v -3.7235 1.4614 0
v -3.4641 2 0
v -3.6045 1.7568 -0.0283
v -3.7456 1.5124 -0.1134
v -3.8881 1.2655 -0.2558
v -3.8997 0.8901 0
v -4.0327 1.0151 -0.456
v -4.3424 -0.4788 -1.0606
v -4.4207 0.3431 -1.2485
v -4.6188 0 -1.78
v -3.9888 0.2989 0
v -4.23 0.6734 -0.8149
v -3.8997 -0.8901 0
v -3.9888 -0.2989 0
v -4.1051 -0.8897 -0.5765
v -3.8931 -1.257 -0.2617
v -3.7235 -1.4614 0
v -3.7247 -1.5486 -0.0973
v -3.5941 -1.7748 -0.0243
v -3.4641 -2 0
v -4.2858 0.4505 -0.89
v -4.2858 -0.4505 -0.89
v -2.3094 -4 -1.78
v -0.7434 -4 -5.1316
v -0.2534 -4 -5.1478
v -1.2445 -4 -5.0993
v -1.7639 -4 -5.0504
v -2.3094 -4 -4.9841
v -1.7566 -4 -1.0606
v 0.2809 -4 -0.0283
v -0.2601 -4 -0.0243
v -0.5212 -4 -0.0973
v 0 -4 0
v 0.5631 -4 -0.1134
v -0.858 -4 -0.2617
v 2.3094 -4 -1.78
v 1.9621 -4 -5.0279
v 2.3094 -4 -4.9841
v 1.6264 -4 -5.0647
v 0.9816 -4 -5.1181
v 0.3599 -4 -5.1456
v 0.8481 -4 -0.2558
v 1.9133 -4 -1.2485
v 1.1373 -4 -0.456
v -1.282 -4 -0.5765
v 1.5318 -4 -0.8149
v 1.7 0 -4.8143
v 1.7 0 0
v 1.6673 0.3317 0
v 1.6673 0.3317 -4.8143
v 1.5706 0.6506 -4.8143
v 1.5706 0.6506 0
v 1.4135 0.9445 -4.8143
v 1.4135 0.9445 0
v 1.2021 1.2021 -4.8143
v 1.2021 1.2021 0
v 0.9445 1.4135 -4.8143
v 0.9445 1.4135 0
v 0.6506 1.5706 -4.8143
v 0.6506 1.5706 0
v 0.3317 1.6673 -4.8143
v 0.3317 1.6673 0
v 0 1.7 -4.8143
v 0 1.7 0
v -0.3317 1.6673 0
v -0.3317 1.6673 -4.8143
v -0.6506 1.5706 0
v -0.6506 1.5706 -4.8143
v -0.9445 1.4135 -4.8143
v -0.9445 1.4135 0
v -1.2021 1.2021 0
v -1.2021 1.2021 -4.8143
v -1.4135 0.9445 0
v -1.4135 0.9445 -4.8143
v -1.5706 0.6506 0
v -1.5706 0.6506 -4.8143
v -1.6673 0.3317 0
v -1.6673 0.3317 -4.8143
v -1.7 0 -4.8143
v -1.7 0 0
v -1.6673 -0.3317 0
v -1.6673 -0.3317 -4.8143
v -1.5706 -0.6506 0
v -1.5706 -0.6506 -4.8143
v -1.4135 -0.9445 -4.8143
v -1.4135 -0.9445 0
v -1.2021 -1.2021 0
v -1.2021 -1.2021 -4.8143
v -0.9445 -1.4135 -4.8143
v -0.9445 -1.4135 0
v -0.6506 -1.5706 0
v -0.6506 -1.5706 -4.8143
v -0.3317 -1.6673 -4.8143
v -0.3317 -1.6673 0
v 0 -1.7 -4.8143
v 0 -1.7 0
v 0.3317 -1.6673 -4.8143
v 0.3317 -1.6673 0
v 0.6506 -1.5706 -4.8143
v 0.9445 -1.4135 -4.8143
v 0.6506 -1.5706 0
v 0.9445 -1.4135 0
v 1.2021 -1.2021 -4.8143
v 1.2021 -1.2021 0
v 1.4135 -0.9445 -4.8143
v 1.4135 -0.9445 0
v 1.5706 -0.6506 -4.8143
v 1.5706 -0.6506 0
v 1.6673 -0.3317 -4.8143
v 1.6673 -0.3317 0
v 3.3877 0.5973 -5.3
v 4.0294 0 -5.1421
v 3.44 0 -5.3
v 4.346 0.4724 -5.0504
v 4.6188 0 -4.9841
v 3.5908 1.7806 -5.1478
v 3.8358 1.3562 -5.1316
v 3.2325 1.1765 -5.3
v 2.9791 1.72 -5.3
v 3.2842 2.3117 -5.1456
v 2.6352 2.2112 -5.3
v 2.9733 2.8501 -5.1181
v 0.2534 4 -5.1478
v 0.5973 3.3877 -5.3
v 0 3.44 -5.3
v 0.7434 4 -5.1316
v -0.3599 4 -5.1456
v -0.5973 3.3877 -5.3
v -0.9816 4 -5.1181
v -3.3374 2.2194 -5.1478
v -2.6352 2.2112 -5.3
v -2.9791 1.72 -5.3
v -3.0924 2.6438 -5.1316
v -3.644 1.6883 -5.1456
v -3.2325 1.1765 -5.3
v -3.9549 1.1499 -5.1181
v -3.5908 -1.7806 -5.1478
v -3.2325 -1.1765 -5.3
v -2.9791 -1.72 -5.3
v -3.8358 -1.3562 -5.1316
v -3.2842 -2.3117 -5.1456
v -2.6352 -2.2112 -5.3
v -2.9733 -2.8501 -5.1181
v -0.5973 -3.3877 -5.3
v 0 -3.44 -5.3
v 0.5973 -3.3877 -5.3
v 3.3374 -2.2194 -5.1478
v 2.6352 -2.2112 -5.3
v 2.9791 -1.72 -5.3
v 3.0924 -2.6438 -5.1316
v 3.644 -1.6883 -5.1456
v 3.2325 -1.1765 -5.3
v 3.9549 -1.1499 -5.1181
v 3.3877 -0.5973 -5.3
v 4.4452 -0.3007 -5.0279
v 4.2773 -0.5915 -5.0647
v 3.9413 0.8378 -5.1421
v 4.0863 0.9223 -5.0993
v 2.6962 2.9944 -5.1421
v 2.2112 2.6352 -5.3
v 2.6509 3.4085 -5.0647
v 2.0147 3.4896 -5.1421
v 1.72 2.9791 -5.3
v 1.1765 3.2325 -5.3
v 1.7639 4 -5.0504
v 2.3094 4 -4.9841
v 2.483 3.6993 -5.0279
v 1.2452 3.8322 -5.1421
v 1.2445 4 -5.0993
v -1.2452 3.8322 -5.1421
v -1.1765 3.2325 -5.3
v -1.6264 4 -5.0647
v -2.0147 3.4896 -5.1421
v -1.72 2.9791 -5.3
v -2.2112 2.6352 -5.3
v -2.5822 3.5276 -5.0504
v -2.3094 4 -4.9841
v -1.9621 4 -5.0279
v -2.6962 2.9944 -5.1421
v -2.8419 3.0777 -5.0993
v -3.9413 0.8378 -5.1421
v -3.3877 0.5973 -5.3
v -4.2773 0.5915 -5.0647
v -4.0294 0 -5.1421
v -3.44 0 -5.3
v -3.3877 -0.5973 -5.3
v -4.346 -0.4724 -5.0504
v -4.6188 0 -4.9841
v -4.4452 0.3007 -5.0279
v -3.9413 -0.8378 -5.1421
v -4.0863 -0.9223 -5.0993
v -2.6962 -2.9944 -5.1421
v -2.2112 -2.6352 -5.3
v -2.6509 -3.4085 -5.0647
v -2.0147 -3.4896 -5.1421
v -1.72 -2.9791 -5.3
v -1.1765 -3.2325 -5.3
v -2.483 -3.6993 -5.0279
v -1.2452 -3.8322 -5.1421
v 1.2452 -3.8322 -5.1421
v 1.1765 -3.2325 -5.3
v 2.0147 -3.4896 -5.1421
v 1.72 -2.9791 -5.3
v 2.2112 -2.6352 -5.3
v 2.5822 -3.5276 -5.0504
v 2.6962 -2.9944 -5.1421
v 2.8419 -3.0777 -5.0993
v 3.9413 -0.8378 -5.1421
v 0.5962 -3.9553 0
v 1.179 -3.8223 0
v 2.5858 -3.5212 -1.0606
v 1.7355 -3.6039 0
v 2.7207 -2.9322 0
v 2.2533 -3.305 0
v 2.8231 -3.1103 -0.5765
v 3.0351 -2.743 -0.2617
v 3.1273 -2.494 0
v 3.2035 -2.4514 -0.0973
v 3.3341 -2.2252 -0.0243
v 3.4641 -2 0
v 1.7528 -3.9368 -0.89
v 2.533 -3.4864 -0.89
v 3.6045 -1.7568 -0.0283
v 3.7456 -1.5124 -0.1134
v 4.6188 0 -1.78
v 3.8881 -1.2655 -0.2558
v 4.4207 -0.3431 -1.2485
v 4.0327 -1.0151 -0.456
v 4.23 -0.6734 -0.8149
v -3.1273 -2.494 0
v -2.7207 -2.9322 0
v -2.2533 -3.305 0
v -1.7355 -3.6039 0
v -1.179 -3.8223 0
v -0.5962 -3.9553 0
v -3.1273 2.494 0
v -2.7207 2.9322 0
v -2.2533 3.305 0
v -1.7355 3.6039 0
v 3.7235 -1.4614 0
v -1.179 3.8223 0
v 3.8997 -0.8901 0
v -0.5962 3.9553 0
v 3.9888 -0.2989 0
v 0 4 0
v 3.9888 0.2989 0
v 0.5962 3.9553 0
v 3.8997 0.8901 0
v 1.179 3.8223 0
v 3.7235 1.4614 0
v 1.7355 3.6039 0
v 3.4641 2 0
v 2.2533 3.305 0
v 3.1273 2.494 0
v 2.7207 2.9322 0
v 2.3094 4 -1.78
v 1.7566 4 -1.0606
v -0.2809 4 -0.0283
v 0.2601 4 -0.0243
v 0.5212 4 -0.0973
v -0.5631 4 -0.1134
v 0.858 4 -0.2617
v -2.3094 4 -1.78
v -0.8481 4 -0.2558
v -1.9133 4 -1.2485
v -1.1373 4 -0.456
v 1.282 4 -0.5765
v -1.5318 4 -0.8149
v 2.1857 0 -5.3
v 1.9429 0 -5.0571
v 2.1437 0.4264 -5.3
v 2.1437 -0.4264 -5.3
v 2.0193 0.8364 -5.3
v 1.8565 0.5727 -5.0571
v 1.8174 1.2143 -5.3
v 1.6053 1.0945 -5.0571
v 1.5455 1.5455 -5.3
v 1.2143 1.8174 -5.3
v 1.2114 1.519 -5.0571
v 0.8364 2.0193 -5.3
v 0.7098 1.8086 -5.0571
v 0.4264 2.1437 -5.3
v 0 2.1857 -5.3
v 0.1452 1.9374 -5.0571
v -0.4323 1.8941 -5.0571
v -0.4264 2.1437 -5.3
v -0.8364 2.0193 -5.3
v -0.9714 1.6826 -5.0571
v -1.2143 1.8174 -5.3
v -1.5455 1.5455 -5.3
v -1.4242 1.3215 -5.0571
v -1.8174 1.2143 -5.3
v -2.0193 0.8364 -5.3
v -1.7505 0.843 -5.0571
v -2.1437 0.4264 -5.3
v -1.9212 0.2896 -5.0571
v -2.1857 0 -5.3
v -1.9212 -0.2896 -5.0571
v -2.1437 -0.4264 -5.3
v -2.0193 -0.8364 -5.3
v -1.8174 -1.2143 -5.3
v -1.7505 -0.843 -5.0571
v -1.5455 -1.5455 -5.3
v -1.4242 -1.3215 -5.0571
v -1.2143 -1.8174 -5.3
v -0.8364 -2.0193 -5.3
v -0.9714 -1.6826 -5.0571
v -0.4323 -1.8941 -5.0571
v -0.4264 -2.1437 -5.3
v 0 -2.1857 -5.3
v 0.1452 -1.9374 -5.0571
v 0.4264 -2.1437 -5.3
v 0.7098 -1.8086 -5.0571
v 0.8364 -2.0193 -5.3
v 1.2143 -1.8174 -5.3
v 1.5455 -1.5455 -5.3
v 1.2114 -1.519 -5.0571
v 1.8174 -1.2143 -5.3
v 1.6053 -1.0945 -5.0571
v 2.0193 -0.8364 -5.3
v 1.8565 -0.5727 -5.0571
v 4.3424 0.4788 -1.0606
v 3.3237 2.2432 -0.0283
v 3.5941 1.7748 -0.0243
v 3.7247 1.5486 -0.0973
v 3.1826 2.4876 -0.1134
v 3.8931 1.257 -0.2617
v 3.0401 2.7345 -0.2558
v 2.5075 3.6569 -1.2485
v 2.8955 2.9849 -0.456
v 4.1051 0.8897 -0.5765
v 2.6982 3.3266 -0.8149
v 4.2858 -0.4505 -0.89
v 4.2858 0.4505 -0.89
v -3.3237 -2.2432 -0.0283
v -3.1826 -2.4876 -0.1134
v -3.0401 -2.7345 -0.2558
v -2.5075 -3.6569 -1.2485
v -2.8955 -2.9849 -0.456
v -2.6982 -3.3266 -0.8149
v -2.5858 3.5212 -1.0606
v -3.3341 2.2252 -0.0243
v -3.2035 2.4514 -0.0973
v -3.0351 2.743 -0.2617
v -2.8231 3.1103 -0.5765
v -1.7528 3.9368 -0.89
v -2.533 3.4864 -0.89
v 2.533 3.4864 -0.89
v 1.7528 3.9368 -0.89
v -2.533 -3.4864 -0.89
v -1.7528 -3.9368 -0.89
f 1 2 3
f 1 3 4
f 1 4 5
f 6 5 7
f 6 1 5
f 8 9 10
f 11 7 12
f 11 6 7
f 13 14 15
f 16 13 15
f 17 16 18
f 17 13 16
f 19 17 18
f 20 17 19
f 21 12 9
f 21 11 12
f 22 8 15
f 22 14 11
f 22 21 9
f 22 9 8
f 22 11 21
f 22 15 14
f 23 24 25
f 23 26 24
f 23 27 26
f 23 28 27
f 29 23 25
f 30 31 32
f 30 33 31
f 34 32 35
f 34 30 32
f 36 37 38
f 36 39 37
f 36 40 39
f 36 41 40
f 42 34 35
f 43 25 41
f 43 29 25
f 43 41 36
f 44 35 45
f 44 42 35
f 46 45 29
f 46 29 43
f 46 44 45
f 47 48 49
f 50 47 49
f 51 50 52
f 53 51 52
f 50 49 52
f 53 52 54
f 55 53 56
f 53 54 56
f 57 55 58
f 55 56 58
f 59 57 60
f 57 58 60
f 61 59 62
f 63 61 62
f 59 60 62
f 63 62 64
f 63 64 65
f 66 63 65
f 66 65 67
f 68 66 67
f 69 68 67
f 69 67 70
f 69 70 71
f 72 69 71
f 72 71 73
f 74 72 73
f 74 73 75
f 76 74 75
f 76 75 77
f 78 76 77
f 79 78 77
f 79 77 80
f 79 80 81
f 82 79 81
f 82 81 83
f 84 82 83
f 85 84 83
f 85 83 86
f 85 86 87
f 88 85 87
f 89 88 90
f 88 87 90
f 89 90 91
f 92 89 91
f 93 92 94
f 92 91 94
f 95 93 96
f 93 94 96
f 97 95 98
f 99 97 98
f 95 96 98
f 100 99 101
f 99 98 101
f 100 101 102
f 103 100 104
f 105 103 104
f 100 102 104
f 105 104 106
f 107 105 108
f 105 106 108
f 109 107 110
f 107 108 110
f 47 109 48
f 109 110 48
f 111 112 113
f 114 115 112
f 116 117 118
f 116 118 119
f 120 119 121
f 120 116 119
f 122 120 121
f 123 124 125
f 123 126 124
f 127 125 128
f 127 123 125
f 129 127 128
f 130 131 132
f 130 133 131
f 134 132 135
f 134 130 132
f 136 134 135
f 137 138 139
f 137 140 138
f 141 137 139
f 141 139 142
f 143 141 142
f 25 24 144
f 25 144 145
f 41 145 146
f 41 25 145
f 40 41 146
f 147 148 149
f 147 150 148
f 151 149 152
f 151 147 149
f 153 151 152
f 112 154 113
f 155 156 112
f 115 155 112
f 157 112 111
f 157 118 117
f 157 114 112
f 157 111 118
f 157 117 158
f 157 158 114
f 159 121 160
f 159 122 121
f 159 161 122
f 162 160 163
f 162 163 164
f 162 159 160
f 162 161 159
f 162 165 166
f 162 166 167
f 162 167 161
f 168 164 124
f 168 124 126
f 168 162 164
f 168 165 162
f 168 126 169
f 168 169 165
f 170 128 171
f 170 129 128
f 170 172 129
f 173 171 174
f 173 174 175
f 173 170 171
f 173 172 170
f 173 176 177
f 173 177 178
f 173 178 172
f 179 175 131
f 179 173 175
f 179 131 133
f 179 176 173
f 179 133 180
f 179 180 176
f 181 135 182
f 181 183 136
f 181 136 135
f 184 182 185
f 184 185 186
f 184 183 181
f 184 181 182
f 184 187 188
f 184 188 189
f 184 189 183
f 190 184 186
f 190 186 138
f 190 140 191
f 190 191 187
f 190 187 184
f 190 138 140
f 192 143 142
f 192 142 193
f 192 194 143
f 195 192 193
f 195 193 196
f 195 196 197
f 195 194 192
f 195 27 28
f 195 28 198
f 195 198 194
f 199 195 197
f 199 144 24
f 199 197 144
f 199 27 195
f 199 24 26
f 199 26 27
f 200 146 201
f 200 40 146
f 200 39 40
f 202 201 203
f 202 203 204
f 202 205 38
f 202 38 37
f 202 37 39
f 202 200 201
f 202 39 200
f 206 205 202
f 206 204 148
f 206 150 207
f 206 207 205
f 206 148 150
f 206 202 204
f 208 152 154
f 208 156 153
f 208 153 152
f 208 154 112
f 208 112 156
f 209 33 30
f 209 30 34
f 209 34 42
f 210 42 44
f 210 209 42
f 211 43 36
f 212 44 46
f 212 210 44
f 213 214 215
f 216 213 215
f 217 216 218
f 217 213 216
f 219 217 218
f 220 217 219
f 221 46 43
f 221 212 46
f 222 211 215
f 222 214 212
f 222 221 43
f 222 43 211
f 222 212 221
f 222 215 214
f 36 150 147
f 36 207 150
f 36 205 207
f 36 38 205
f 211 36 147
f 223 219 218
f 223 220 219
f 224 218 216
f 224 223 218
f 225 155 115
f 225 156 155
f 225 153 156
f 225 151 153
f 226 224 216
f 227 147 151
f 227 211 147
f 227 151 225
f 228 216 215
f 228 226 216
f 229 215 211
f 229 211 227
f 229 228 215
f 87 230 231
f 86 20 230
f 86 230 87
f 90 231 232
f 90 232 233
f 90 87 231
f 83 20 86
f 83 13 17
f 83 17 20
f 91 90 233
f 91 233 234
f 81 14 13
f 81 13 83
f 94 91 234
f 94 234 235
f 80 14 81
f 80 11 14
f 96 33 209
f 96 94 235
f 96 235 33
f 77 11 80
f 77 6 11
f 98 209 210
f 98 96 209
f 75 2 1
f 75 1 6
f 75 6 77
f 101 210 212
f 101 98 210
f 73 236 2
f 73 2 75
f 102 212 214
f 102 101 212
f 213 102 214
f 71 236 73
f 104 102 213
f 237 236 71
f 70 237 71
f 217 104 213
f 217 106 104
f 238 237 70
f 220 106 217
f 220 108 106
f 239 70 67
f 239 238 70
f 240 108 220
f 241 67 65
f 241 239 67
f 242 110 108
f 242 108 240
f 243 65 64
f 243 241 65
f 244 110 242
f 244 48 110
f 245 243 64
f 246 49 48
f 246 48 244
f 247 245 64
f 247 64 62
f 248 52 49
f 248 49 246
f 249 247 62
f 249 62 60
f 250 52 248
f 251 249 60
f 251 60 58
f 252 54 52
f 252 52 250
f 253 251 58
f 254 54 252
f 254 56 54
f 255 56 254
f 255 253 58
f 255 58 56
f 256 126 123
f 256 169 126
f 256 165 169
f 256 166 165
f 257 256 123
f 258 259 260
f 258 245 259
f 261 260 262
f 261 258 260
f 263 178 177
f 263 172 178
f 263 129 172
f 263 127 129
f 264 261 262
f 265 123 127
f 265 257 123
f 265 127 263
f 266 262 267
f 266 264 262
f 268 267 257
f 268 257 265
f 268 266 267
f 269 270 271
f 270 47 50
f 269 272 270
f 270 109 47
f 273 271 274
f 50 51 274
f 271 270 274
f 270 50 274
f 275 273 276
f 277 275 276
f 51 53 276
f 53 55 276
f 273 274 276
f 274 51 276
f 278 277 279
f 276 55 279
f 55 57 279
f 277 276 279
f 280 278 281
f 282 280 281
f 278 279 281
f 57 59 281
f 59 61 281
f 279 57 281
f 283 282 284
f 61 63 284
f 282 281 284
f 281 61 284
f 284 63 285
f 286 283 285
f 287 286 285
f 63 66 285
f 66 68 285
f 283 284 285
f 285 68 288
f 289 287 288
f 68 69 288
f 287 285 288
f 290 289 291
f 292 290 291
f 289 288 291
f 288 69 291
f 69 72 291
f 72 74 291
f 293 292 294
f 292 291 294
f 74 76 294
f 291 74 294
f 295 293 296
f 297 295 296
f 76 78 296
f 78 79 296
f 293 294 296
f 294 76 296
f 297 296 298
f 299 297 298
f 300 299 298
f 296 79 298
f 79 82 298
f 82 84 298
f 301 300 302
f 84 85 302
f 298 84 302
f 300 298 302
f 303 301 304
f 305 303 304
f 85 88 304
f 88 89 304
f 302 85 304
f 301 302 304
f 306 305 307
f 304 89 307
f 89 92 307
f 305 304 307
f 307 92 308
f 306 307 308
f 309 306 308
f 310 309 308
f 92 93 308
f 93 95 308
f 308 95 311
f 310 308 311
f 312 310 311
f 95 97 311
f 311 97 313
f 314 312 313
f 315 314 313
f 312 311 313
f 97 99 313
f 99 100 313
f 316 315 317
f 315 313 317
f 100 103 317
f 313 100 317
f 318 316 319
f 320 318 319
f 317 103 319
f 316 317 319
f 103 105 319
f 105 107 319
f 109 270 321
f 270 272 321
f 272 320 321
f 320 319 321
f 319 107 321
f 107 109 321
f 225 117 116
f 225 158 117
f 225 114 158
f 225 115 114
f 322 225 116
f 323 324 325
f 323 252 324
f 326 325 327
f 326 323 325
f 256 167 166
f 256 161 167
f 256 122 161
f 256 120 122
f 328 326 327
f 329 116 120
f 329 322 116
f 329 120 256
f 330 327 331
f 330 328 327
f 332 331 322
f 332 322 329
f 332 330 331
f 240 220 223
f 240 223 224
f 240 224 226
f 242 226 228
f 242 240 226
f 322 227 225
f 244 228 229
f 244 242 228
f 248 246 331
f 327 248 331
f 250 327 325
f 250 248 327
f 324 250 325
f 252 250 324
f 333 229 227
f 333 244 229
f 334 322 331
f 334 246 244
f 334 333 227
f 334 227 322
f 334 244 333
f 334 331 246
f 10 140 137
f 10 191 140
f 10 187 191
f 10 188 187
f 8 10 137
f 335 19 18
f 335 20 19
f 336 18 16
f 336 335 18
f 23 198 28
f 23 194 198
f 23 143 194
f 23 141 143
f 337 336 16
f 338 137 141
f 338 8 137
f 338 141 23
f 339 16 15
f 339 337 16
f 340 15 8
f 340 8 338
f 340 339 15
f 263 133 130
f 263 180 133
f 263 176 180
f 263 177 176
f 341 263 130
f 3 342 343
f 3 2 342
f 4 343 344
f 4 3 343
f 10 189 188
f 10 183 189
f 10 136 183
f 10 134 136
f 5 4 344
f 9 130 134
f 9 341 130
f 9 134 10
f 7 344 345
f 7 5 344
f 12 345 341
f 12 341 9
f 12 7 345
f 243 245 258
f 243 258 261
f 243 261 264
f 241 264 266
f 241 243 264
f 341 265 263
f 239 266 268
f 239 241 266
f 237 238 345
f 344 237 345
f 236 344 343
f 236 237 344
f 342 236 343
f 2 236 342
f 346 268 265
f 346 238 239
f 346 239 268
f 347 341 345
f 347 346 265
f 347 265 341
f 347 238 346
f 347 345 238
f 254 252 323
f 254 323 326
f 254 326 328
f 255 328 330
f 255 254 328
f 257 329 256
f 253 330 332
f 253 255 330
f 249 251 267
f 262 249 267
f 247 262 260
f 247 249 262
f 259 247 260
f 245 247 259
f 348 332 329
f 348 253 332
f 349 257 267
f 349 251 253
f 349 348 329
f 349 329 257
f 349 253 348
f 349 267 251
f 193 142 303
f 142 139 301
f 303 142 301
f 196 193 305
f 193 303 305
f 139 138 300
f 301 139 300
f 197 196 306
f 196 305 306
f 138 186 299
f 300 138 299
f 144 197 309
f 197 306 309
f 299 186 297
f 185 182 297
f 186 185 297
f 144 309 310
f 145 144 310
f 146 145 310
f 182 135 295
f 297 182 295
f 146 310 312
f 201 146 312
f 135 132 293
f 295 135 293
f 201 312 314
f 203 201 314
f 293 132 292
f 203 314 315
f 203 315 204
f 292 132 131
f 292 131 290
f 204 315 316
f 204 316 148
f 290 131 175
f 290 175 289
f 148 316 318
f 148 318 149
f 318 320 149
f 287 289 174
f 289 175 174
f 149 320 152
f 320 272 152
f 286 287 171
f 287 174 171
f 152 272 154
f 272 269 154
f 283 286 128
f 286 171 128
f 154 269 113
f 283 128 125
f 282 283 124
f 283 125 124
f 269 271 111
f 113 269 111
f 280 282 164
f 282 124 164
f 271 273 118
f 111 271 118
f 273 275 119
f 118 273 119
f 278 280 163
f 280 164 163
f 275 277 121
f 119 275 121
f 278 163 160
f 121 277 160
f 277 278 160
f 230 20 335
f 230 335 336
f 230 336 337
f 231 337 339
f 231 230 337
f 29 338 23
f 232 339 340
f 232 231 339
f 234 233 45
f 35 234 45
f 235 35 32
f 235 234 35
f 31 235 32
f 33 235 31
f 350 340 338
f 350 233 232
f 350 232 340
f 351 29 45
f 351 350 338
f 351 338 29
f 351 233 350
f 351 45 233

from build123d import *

# Parameters (mm, degrees)
BASENUT_DEPTH   = 5.3
SKETCH3_R       = 1.7
HOLE_DEPTH      = 6.3
ENDCHAMFER_SIZE = 0.485714286


with BuildPart() as part:
    # Sketch1 → BaseNut (new body)
    with BuildSketch(Plane.XY):
        Polygon((2.309401077, -4), (4.618802154, 0), (2.309401077, 4), (-2.309401077, 4), (-4.618802154, 0), (-2.309401077, -4), align=None)
    extrude(amount=-BASENUT_DEPTH)

    # Sketch2 → Double-Chamfer (revolve, cut)
    with BuildSketch(Plane(origin=(0.481162538, 0, -5.099964691), x_dir=(0, 0, -1), z_dir=(0, -1, 0))):
        Polygon((-0.115823776, 4.137639616), (0.200035309, 4.137639616), (0.200035309, 2.958837462), align=None)
        Polygon((-5.099964691, 4.137639616), (-3.319964691, 4.137639616), (-5.099964691, 3.518837462), align=None)
    revolve(axis=Axis((0, 0, -4.462865094), (0, 0, 1)), mode=Mode.SUBTRACT)

    # Sketch3 → Hole (cut, through all)
    with BuildSketch(Plane.XY):
        Circle(SKETCH3_R)
    extrude(amount=-HOLE_DEPTH, mode=Mode.SUBTRACT)

    # EndChamfer
    endchamfer_edges = [part.edges().sort_by_distance(p)[0] for p in [
        (-1.7, 0, -5.3),
    ]]
    chamfer(endchamfer_edges, length=ENDCHAMFER_SIZE)


solid = part.part
